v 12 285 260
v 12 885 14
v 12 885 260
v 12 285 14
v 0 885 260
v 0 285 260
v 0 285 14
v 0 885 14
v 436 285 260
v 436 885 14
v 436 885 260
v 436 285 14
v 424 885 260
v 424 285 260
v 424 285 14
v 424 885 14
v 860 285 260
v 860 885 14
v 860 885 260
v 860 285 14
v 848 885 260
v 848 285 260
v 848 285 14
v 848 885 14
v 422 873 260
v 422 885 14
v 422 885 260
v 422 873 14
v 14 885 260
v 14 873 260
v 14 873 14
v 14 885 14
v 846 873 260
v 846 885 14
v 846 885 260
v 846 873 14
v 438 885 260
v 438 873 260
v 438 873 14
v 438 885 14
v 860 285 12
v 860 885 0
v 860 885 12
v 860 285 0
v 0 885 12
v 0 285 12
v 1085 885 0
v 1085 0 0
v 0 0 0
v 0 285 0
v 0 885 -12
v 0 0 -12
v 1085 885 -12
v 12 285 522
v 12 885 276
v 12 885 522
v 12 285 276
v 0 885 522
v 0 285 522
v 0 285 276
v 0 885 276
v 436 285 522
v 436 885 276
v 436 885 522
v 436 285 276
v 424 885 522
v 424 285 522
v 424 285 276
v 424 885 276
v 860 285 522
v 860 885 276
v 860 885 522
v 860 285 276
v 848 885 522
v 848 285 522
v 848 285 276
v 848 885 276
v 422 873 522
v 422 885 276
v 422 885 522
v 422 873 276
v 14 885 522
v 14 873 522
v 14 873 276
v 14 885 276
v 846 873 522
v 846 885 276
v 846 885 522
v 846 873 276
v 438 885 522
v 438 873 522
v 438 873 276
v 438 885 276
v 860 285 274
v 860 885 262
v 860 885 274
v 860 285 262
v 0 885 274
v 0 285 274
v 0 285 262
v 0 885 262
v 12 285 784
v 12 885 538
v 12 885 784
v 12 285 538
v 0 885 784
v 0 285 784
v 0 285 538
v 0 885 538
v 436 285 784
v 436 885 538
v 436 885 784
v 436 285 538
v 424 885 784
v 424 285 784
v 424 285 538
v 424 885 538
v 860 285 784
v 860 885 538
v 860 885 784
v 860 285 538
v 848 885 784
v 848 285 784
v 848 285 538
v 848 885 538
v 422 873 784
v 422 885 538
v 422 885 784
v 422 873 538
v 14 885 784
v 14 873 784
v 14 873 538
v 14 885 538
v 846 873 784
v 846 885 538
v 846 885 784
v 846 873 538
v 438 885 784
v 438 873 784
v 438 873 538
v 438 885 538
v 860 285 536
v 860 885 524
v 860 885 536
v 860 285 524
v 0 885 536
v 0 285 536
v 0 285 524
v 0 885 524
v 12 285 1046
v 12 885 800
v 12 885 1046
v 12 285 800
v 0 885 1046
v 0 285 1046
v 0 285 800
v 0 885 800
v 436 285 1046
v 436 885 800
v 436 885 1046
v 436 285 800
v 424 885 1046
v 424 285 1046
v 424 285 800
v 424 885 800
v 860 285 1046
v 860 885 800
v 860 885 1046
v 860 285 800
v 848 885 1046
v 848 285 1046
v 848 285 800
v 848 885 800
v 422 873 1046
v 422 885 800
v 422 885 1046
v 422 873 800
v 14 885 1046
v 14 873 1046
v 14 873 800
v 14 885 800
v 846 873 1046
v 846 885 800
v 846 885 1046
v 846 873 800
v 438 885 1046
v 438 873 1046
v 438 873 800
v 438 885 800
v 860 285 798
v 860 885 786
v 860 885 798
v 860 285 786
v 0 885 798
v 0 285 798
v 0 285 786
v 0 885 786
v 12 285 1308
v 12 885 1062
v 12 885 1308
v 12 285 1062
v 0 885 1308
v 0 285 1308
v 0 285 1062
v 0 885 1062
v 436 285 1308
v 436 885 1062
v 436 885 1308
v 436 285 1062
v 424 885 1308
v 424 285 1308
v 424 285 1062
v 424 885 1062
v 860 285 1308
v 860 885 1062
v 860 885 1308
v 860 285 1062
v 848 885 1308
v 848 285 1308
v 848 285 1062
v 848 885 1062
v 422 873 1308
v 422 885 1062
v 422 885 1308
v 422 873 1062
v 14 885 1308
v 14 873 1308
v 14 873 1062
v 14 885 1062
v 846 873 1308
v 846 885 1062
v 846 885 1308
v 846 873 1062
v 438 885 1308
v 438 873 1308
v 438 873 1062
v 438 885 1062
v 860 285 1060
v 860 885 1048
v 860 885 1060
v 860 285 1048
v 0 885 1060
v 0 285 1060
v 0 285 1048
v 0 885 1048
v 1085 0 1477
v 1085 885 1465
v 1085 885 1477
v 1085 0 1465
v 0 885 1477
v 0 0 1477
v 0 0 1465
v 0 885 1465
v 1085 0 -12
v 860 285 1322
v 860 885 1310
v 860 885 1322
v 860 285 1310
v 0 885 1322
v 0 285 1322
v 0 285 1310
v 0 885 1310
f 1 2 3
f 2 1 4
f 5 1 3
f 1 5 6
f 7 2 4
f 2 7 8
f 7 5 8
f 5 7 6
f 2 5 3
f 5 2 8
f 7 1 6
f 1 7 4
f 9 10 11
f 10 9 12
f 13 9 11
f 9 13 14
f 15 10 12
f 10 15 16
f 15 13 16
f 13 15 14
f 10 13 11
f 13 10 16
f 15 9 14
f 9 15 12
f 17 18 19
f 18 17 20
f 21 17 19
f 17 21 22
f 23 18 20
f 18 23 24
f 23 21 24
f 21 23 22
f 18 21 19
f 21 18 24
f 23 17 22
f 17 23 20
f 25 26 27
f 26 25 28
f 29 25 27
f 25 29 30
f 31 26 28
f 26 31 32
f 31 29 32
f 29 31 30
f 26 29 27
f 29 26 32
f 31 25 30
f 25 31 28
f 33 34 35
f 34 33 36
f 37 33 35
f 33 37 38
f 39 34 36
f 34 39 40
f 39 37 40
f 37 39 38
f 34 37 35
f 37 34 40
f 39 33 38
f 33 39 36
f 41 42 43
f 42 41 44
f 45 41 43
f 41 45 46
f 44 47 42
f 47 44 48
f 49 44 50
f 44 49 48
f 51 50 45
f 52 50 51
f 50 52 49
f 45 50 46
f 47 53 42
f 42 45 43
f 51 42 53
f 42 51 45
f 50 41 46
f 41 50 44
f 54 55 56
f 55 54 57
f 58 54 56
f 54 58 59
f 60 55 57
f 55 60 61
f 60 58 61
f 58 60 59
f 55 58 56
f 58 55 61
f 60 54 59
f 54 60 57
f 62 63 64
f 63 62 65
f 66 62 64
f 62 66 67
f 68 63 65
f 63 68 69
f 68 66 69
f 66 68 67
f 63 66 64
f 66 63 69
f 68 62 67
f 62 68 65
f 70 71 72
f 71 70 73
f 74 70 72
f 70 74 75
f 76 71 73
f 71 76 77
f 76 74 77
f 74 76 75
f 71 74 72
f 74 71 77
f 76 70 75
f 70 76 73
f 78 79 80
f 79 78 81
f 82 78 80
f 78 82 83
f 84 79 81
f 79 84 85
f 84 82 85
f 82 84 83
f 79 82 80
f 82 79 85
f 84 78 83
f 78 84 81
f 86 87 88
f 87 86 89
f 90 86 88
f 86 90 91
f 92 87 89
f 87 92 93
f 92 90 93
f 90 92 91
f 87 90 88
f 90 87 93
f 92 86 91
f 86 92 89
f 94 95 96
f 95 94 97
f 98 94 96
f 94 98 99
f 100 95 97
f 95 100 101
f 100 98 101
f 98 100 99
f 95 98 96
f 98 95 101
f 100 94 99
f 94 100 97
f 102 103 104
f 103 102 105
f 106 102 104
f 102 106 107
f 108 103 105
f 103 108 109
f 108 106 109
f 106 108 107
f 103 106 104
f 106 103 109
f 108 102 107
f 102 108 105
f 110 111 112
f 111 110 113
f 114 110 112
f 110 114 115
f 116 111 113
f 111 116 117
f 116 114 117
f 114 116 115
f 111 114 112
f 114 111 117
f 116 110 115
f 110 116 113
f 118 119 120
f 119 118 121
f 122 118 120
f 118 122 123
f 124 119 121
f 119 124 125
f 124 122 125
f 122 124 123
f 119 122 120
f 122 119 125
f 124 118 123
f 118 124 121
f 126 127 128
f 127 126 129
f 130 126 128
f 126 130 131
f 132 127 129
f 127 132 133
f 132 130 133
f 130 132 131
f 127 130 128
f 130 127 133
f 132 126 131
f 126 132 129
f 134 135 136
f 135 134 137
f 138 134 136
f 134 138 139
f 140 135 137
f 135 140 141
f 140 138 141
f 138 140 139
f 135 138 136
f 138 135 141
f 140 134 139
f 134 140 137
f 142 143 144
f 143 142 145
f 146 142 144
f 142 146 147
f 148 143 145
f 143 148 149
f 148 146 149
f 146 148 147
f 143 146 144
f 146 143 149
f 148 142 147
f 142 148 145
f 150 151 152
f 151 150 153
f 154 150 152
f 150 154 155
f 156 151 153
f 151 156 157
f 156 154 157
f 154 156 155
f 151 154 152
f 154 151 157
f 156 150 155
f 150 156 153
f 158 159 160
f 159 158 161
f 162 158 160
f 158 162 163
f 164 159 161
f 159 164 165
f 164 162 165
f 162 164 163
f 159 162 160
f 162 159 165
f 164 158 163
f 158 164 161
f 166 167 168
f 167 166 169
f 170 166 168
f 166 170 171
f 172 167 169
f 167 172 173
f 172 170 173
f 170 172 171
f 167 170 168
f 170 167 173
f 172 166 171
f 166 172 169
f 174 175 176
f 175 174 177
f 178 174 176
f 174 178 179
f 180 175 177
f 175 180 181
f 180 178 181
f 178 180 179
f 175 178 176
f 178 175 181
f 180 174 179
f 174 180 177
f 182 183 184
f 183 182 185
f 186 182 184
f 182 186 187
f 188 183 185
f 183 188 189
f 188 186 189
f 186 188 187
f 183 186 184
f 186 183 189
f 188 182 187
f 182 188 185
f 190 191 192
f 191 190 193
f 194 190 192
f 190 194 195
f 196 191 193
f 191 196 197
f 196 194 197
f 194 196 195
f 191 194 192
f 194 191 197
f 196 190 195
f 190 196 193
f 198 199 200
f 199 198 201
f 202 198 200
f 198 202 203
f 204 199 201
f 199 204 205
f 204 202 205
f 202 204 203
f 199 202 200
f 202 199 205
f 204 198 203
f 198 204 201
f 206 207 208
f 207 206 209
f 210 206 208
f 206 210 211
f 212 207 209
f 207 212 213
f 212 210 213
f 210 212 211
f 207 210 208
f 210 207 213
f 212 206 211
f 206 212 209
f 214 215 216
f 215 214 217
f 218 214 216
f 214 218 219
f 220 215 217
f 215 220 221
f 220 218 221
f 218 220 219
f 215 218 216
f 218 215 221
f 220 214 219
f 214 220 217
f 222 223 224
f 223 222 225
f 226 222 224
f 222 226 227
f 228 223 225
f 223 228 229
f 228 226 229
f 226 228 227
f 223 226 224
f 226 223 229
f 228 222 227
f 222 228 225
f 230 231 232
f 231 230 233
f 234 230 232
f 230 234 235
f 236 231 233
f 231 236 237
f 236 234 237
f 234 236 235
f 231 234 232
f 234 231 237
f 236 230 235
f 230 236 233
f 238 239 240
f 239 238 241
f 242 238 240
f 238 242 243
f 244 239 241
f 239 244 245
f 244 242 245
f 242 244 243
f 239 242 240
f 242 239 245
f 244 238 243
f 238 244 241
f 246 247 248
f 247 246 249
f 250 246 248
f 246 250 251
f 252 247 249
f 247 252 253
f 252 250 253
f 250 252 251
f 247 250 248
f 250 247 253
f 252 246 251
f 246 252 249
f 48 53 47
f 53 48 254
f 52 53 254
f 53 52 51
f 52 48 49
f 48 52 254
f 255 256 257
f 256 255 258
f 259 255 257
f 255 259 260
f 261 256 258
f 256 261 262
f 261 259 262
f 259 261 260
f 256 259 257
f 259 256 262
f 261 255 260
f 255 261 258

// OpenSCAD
/*

Cat climbing wall - wall bracket jig
@idnorton
2021-10-23

Licenced as Creative Commons Attribution Non Commercial 3.0
See https://creativecommons.org/licenses/by-nc/3.0/

Specifically you may not sell the design or products using the design.
You're welcome to use the design to build these for your own use :)

*/


// Board thickness and saw kerf
thickness = 12;
kerf = 2;

// Overall size of cupboard
x_size = 1085;
y_size = 885;
z_size = 1465;

// top & bottom of the cupboard
translate([0, 0, z_size]) {top_bottom(x_size, y_size, thickness);};
translate([0, 0, -thickness]) {top_bottom(x_size, y_size, thickness);};

// Box size
x_box = 412;
y_box = 600;
z_box = 250;

boxes_wide = 2;
boxes_high = 4;

for ( i = [ 0 : 1 : boxes_high ] ) {
    translate([0, y_size - y_box, (i * (z_box + thickness))]) {
        shelf();
    }
}

module shelf () {

    // bottom of shelf
    cube([
        (thickness + (boxes_wide * (x_box + thickness))),
        y_box,
        thickness
    ]);


    for ( i = [ 0 : 1 : boxes_wide ] ) {

        x = (i * (x_box + thickness));
        //echo("Vertical position:");
        //echo(x);

        // Vertical front to back
        translate([
            x,
            0,
            thickness + kerf
        ]) {
            cube([
                thickness,
                y_box,
                z_box - (2 * kerf)
            ]);
        }
    }

    for ( i = [ 0 : 1 : boxes_wide - 1 ] ) {

        x = thickness + kerf + (i * (x_box + thickness));
        //echo("Back panel position: ");
        //echo(x);

        // Back panel
        translate([
            x,
            y_box - thickness,
            thickness + kerf
        ]) {
            cube([
                x_box - (2*kerf),
                thickness,
                z_box - (2*kerf)
            ]);
        }
    }
}

// top of shelf
translate([0, y_size - y_box, ((boxes_high + 1) * (z_box + thickness))]) {
    cube([
        ((x_box + thickness) * boxes_wide) + thickness,
        y_box,
        thickness
    ]);
}

module top_bottom (x, y, thickness) {
    color("green") {
        cube(size = [x, y, thickness]);
    }
}
